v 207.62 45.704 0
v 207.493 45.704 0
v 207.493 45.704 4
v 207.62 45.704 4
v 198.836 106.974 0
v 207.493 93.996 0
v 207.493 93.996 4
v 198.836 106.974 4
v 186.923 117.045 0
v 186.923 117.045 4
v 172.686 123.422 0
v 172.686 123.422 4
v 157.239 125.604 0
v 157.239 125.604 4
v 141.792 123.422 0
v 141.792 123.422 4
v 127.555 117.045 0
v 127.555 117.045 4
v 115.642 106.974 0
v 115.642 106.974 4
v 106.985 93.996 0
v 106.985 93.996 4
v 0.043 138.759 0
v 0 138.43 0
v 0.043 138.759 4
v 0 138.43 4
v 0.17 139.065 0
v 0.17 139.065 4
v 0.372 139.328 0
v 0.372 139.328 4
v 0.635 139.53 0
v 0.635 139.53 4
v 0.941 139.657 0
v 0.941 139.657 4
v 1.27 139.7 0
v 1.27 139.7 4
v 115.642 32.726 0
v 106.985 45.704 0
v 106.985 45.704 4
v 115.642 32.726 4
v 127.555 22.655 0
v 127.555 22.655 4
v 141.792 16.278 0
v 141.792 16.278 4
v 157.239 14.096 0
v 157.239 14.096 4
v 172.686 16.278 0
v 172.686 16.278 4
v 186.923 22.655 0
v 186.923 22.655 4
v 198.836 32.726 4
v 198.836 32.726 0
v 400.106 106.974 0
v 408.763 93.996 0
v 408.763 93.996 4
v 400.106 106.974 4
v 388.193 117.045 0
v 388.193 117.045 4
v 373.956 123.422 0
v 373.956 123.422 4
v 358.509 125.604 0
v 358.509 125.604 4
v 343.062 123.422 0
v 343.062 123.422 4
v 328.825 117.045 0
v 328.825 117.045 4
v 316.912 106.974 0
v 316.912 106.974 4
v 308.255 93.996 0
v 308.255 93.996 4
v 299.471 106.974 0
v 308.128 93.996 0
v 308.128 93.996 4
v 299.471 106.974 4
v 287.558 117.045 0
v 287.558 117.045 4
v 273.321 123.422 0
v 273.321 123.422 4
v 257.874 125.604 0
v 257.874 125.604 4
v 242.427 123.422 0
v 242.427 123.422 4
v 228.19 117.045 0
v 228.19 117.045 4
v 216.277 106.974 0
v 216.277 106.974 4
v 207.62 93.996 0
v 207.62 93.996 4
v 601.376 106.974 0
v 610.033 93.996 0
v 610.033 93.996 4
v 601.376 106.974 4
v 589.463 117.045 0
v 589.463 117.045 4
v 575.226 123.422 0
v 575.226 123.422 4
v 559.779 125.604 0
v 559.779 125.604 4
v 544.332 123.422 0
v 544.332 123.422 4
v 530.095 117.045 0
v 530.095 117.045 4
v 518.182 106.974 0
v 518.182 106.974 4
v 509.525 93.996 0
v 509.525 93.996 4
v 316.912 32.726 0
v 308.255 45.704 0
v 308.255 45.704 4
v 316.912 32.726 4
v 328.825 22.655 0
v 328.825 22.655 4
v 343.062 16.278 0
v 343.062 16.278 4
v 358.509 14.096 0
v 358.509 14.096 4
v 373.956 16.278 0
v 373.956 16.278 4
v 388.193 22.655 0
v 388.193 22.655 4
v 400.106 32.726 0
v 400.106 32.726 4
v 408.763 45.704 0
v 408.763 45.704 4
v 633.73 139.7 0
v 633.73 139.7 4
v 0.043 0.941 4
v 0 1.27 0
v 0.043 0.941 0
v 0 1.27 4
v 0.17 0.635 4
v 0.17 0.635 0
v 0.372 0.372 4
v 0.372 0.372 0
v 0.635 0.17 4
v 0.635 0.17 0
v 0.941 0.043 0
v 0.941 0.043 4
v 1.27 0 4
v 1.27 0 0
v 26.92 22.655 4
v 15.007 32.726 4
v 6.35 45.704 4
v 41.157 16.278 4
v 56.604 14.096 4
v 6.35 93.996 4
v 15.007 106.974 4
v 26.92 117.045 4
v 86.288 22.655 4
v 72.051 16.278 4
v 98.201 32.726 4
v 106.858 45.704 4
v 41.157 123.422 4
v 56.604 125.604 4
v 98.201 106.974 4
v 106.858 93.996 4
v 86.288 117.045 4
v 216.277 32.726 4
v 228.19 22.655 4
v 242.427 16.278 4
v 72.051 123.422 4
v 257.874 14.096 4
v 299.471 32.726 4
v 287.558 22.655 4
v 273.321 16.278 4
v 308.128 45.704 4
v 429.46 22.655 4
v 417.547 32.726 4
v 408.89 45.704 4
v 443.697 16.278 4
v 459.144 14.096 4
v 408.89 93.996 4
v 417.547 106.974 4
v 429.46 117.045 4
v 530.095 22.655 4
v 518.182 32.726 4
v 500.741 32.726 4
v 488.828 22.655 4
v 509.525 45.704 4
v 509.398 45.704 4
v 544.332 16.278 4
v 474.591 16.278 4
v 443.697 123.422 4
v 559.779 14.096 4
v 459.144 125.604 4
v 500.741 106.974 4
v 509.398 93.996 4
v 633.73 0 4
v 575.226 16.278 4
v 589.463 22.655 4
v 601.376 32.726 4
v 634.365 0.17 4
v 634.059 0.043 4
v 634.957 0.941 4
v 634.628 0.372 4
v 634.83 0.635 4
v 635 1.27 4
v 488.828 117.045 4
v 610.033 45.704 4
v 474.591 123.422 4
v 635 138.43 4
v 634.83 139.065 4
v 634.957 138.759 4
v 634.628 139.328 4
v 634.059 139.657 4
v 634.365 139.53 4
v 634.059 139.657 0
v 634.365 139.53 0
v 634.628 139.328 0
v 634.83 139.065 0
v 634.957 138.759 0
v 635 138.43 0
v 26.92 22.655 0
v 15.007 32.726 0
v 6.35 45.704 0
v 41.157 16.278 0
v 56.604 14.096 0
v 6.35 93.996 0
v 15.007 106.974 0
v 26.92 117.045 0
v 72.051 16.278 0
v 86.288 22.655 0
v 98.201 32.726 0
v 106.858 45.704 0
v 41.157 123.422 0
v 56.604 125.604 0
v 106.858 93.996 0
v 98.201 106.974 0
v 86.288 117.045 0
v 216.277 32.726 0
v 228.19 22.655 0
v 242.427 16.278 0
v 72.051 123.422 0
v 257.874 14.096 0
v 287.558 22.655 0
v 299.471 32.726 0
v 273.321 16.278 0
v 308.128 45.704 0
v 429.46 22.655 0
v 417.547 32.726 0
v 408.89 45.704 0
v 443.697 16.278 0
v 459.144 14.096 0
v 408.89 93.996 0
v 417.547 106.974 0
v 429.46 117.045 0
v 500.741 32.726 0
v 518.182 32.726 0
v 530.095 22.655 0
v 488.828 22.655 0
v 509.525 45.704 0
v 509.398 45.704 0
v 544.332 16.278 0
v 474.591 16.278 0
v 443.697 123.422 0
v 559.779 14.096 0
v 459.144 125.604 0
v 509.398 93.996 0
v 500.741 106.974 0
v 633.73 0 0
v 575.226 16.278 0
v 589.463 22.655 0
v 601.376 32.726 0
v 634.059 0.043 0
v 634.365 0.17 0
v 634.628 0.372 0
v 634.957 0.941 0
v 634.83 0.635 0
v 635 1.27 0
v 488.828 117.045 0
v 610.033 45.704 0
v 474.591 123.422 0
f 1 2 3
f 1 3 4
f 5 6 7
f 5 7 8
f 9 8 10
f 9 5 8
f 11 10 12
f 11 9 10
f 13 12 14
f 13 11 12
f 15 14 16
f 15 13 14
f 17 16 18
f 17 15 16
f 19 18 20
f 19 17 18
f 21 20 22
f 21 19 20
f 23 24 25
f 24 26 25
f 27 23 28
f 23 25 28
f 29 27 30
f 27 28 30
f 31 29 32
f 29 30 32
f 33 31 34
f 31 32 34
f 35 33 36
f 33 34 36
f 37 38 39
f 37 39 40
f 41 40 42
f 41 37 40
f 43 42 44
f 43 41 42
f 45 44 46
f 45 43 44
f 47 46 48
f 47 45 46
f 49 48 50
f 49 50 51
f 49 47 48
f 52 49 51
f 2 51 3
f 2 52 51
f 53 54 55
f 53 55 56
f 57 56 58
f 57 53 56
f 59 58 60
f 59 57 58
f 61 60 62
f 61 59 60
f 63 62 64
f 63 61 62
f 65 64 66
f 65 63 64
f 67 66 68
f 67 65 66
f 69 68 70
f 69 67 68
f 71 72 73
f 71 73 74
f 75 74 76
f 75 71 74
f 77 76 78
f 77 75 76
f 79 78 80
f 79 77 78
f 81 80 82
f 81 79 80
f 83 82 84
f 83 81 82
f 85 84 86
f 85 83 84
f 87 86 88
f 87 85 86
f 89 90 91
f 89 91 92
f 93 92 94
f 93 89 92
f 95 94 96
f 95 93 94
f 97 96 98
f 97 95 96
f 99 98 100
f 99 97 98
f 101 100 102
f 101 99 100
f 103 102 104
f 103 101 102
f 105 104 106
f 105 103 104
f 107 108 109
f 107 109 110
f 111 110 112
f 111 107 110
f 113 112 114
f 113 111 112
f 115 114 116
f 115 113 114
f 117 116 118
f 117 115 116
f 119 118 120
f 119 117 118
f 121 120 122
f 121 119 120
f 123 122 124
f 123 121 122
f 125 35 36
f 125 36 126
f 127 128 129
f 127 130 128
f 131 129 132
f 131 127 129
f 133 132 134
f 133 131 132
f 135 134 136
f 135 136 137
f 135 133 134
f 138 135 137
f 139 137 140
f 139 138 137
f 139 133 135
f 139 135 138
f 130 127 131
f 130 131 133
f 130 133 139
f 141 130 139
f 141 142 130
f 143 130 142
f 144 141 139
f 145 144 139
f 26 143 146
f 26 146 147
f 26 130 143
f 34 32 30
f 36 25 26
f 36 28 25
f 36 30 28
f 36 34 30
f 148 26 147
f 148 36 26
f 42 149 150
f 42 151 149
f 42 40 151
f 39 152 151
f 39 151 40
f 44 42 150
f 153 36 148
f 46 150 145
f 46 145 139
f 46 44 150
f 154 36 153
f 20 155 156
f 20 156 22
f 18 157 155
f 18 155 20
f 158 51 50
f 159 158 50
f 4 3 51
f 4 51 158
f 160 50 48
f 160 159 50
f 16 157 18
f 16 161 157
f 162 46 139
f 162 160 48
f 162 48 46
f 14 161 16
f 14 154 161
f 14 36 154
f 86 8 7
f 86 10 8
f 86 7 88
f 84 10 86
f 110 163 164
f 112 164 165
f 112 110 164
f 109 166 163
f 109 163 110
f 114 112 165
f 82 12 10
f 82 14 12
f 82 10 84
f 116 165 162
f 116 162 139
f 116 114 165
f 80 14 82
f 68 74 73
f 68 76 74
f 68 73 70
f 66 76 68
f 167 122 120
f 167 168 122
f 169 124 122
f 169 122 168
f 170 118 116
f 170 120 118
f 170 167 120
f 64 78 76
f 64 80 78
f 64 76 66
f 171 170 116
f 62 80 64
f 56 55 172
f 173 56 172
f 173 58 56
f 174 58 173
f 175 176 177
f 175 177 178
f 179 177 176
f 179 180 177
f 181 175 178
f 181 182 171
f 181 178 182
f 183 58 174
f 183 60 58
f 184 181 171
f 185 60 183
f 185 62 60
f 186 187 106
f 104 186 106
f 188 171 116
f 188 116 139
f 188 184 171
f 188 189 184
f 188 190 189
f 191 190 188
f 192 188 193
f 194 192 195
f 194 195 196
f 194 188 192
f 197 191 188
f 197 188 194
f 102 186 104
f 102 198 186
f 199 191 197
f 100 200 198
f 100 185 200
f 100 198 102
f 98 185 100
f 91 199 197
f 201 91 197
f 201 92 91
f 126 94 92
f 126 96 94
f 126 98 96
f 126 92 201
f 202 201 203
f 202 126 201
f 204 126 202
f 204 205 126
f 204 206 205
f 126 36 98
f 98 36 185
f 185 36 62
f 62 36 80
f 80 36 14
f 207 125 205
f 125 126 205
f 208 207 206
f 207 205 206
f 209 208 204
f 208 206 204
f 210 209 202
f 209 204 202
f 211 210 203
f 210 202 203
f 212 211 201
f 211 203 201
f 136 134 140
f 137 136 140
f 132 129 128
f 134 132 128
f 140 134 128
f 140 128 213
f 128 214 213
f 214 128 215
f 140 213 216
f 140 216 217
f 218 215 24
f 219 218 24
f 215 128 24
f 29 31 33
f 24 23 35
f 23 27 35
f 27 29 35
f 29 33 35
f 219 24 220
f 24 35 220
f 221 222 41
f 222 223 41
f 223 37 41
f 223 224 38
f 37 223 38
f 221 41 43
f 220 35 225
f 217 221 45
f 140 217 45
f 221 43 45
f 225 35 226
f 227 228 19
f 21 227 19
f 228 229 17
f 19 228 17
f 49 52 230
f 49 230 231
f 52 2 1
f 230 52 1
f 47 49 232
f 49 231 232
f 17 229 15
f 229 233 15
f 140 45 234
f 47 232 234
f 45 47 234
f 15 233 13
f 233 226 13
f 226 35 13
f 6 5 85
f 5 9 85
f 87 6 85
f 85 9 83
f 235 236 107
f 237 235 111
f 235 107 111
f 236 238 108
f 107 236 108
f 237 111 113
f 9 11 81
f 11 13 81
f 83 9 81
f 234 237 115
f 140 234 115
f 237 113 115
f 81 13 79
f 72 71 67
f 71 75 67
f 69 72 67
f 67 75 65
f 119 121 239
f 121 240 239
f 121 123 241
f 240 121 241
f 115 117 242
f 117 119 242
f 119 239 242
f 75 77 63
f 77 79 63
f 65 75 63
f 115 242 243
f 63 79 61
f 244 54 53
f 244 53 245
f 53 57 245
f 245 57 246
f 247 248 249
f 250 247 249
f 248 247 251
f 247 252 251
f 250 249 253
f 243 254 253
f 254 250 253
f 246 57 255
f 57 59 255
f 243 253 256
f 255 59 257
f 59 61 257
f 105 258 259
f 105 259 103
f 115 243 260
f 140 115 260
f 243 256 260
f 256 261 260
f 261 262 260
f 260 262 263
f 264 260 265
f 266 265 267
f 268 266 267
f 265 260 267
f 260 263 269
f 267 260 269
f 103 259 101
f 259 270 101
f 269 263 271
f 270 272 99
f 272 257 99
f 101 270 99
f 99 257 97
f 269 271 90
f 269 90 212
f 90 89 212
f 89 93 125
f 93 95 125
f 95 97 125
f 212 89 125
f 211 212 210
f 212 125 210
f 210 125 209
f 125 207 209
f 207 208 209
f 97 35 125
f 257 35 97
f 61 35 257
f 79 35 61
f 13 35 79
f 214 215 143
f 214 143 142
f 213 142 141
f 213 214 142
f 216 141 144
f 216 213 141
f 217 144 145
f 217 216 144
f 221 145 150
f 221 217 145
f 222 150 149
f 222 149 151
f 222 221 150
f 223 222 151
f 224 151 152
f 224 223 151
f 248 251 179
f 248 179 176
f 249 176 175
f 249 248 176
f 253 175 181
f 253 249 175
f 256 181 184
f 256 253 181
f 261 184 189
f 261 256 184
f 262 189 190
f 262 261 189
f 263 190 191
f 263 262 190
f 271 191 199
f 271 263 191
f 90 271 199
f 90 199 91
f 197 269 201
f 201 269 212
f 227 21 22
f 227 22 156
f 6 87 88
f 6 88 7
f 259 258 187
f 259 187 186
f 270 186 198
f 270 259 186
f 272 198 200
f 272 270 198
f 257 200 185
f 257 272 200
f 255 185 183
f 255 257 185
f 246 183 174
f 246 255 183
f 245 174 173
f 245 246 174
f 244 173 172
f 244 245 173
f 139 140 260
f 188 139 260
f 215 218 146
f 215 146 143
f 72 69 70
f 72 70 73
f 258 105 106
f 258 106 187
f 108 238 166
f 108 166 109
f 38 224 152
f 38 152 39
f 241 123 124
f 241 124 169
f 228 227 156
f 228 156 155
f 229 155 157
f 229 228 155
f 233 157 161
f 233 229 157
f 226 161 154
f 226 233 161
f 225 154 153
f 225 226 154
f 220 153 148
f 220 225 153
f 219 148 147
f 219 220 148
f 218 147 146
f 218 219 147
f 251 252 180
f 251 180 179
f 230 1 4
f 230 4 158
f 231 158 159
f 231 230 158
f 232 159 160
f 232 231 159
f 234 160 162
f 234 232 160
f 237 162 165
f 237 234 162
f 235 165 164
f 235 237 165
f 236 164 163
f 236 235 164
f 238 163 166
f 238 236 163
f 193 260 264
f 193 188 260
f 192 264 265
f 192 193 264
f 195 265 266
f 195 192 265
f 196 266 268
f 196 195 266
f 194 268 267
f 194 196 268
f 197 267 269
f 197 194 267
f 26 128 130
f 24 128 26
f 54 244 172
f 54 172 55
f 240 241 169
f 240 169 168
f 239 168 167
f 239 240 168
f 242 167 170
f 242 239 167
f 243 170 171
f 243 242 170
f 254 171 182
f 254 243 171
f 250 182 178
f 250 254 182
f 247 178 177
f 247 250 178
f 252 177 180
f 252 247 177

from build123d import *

# Parameters (mm, degrees)
SKETCH4_W                                = 635
SKETCH4_H                                = 139.7
DIMENSIONS_CONTROL_OPTICS_LOCATION_DEPTH = 4
FILLET1_R                                = 1.27


with BuildPart() as part:
    # Sketch4 → DIMENSIONS CONTROL OPTICS LOCATION (new body)
    with BuildSketch(Plane.XY):
        with Locations((317.5, 69.85)):
            Rectangle(SKETCH4_W, SKETCH4_H)
        with BuildLine():
            Line((6.35, 93.996304065), (6.35, 45.703695935))
            ThreePointArc((6.35, 45.703695935), (56.604, 14.096), (106.858, 45.703695935))
            Line((106.858, 45.703695935), (106.985, 45.703695935))
            ThreePointArc((106.985, 45.703695935), (157.239, 14.096), (207.493, 45.703695935))
            Line((207.493, 45.703695935), (207.62, 45.703695935))
            ThreePointArc((207.62, 45.703695935), (257.874, 14.096), (308.128, 45.703695935))
            Line((308.128, 45.703695935), (308.255, 45.703695935))
            ThreePointArc((308.255, 45.703695935), (358.509, 14.096), (408.763, 45.703695935))
            Line((408.763, 45.703695935), (408.89, 45.703695935))
            ThreePointArc((408.89, 45.703695935), (459.144, 14.096), (509.398, 45.703695935))
            Line((509.398, 45.703695935), (509.525, 45.703695935))
            ThreePointArc((509.525, 45.703695935), (559.779, 14.096), (610.033, 45.703695935))
            Line((610.033, 45.703695935), (610.033, 93.996304065))
            ThreePointArc((610.033, 93.996304065), (559.779, 125.604), (509.525, 93.996304065))
            Line((509.525, 93.996304065), (509.398, 93.996304065))
            ThreePointArc((509.398, 93.996304065), (459.144, 125.604), (408.89, 93.996304065))
            Line((408.89, 93.996304065), (408.763, 93.996304065))
            ThreePointArc((408.763, 93.996304065), (358.509, 125.604), (308.255, 93.996304065))
            Line((308.255, 93.996304065), (308.128, 93.996304065))
            ThreePointArc((308.128, 93.996304065), (257.874, 125.604), (207.62, 93.996304065))
            Line((207.62, 93.996304065), (207.493, 93.996304065))
            ThreePointArc((207.493, 93.996304065), (157.239, 125.604), (106.985, 93.996304065))
            Line((106.985, 93.996304065), (106.858, 93.996304065))
            ThreePointArc((106.858, 93.996304065), (56.604, 125.604), (6.35, 93.996304065))
        make_face(mode=Mode.SUBTRACT)
    extrude(amount=DIMENSIONS_CONTROL_OPTICS_LOCATION_DEPTH)

    # Fillet1
    fillet1_edges = [part.edges().sort_by_distance(p)[0] for p in [
        (635, 0, 2),
        (0, 0, 2),
        (0, 139.7, 2),
        (635, 139.7, 2),
    ]]
    fillet(fillet1_edges, radius=FILLET1_R)


solid = part.part
